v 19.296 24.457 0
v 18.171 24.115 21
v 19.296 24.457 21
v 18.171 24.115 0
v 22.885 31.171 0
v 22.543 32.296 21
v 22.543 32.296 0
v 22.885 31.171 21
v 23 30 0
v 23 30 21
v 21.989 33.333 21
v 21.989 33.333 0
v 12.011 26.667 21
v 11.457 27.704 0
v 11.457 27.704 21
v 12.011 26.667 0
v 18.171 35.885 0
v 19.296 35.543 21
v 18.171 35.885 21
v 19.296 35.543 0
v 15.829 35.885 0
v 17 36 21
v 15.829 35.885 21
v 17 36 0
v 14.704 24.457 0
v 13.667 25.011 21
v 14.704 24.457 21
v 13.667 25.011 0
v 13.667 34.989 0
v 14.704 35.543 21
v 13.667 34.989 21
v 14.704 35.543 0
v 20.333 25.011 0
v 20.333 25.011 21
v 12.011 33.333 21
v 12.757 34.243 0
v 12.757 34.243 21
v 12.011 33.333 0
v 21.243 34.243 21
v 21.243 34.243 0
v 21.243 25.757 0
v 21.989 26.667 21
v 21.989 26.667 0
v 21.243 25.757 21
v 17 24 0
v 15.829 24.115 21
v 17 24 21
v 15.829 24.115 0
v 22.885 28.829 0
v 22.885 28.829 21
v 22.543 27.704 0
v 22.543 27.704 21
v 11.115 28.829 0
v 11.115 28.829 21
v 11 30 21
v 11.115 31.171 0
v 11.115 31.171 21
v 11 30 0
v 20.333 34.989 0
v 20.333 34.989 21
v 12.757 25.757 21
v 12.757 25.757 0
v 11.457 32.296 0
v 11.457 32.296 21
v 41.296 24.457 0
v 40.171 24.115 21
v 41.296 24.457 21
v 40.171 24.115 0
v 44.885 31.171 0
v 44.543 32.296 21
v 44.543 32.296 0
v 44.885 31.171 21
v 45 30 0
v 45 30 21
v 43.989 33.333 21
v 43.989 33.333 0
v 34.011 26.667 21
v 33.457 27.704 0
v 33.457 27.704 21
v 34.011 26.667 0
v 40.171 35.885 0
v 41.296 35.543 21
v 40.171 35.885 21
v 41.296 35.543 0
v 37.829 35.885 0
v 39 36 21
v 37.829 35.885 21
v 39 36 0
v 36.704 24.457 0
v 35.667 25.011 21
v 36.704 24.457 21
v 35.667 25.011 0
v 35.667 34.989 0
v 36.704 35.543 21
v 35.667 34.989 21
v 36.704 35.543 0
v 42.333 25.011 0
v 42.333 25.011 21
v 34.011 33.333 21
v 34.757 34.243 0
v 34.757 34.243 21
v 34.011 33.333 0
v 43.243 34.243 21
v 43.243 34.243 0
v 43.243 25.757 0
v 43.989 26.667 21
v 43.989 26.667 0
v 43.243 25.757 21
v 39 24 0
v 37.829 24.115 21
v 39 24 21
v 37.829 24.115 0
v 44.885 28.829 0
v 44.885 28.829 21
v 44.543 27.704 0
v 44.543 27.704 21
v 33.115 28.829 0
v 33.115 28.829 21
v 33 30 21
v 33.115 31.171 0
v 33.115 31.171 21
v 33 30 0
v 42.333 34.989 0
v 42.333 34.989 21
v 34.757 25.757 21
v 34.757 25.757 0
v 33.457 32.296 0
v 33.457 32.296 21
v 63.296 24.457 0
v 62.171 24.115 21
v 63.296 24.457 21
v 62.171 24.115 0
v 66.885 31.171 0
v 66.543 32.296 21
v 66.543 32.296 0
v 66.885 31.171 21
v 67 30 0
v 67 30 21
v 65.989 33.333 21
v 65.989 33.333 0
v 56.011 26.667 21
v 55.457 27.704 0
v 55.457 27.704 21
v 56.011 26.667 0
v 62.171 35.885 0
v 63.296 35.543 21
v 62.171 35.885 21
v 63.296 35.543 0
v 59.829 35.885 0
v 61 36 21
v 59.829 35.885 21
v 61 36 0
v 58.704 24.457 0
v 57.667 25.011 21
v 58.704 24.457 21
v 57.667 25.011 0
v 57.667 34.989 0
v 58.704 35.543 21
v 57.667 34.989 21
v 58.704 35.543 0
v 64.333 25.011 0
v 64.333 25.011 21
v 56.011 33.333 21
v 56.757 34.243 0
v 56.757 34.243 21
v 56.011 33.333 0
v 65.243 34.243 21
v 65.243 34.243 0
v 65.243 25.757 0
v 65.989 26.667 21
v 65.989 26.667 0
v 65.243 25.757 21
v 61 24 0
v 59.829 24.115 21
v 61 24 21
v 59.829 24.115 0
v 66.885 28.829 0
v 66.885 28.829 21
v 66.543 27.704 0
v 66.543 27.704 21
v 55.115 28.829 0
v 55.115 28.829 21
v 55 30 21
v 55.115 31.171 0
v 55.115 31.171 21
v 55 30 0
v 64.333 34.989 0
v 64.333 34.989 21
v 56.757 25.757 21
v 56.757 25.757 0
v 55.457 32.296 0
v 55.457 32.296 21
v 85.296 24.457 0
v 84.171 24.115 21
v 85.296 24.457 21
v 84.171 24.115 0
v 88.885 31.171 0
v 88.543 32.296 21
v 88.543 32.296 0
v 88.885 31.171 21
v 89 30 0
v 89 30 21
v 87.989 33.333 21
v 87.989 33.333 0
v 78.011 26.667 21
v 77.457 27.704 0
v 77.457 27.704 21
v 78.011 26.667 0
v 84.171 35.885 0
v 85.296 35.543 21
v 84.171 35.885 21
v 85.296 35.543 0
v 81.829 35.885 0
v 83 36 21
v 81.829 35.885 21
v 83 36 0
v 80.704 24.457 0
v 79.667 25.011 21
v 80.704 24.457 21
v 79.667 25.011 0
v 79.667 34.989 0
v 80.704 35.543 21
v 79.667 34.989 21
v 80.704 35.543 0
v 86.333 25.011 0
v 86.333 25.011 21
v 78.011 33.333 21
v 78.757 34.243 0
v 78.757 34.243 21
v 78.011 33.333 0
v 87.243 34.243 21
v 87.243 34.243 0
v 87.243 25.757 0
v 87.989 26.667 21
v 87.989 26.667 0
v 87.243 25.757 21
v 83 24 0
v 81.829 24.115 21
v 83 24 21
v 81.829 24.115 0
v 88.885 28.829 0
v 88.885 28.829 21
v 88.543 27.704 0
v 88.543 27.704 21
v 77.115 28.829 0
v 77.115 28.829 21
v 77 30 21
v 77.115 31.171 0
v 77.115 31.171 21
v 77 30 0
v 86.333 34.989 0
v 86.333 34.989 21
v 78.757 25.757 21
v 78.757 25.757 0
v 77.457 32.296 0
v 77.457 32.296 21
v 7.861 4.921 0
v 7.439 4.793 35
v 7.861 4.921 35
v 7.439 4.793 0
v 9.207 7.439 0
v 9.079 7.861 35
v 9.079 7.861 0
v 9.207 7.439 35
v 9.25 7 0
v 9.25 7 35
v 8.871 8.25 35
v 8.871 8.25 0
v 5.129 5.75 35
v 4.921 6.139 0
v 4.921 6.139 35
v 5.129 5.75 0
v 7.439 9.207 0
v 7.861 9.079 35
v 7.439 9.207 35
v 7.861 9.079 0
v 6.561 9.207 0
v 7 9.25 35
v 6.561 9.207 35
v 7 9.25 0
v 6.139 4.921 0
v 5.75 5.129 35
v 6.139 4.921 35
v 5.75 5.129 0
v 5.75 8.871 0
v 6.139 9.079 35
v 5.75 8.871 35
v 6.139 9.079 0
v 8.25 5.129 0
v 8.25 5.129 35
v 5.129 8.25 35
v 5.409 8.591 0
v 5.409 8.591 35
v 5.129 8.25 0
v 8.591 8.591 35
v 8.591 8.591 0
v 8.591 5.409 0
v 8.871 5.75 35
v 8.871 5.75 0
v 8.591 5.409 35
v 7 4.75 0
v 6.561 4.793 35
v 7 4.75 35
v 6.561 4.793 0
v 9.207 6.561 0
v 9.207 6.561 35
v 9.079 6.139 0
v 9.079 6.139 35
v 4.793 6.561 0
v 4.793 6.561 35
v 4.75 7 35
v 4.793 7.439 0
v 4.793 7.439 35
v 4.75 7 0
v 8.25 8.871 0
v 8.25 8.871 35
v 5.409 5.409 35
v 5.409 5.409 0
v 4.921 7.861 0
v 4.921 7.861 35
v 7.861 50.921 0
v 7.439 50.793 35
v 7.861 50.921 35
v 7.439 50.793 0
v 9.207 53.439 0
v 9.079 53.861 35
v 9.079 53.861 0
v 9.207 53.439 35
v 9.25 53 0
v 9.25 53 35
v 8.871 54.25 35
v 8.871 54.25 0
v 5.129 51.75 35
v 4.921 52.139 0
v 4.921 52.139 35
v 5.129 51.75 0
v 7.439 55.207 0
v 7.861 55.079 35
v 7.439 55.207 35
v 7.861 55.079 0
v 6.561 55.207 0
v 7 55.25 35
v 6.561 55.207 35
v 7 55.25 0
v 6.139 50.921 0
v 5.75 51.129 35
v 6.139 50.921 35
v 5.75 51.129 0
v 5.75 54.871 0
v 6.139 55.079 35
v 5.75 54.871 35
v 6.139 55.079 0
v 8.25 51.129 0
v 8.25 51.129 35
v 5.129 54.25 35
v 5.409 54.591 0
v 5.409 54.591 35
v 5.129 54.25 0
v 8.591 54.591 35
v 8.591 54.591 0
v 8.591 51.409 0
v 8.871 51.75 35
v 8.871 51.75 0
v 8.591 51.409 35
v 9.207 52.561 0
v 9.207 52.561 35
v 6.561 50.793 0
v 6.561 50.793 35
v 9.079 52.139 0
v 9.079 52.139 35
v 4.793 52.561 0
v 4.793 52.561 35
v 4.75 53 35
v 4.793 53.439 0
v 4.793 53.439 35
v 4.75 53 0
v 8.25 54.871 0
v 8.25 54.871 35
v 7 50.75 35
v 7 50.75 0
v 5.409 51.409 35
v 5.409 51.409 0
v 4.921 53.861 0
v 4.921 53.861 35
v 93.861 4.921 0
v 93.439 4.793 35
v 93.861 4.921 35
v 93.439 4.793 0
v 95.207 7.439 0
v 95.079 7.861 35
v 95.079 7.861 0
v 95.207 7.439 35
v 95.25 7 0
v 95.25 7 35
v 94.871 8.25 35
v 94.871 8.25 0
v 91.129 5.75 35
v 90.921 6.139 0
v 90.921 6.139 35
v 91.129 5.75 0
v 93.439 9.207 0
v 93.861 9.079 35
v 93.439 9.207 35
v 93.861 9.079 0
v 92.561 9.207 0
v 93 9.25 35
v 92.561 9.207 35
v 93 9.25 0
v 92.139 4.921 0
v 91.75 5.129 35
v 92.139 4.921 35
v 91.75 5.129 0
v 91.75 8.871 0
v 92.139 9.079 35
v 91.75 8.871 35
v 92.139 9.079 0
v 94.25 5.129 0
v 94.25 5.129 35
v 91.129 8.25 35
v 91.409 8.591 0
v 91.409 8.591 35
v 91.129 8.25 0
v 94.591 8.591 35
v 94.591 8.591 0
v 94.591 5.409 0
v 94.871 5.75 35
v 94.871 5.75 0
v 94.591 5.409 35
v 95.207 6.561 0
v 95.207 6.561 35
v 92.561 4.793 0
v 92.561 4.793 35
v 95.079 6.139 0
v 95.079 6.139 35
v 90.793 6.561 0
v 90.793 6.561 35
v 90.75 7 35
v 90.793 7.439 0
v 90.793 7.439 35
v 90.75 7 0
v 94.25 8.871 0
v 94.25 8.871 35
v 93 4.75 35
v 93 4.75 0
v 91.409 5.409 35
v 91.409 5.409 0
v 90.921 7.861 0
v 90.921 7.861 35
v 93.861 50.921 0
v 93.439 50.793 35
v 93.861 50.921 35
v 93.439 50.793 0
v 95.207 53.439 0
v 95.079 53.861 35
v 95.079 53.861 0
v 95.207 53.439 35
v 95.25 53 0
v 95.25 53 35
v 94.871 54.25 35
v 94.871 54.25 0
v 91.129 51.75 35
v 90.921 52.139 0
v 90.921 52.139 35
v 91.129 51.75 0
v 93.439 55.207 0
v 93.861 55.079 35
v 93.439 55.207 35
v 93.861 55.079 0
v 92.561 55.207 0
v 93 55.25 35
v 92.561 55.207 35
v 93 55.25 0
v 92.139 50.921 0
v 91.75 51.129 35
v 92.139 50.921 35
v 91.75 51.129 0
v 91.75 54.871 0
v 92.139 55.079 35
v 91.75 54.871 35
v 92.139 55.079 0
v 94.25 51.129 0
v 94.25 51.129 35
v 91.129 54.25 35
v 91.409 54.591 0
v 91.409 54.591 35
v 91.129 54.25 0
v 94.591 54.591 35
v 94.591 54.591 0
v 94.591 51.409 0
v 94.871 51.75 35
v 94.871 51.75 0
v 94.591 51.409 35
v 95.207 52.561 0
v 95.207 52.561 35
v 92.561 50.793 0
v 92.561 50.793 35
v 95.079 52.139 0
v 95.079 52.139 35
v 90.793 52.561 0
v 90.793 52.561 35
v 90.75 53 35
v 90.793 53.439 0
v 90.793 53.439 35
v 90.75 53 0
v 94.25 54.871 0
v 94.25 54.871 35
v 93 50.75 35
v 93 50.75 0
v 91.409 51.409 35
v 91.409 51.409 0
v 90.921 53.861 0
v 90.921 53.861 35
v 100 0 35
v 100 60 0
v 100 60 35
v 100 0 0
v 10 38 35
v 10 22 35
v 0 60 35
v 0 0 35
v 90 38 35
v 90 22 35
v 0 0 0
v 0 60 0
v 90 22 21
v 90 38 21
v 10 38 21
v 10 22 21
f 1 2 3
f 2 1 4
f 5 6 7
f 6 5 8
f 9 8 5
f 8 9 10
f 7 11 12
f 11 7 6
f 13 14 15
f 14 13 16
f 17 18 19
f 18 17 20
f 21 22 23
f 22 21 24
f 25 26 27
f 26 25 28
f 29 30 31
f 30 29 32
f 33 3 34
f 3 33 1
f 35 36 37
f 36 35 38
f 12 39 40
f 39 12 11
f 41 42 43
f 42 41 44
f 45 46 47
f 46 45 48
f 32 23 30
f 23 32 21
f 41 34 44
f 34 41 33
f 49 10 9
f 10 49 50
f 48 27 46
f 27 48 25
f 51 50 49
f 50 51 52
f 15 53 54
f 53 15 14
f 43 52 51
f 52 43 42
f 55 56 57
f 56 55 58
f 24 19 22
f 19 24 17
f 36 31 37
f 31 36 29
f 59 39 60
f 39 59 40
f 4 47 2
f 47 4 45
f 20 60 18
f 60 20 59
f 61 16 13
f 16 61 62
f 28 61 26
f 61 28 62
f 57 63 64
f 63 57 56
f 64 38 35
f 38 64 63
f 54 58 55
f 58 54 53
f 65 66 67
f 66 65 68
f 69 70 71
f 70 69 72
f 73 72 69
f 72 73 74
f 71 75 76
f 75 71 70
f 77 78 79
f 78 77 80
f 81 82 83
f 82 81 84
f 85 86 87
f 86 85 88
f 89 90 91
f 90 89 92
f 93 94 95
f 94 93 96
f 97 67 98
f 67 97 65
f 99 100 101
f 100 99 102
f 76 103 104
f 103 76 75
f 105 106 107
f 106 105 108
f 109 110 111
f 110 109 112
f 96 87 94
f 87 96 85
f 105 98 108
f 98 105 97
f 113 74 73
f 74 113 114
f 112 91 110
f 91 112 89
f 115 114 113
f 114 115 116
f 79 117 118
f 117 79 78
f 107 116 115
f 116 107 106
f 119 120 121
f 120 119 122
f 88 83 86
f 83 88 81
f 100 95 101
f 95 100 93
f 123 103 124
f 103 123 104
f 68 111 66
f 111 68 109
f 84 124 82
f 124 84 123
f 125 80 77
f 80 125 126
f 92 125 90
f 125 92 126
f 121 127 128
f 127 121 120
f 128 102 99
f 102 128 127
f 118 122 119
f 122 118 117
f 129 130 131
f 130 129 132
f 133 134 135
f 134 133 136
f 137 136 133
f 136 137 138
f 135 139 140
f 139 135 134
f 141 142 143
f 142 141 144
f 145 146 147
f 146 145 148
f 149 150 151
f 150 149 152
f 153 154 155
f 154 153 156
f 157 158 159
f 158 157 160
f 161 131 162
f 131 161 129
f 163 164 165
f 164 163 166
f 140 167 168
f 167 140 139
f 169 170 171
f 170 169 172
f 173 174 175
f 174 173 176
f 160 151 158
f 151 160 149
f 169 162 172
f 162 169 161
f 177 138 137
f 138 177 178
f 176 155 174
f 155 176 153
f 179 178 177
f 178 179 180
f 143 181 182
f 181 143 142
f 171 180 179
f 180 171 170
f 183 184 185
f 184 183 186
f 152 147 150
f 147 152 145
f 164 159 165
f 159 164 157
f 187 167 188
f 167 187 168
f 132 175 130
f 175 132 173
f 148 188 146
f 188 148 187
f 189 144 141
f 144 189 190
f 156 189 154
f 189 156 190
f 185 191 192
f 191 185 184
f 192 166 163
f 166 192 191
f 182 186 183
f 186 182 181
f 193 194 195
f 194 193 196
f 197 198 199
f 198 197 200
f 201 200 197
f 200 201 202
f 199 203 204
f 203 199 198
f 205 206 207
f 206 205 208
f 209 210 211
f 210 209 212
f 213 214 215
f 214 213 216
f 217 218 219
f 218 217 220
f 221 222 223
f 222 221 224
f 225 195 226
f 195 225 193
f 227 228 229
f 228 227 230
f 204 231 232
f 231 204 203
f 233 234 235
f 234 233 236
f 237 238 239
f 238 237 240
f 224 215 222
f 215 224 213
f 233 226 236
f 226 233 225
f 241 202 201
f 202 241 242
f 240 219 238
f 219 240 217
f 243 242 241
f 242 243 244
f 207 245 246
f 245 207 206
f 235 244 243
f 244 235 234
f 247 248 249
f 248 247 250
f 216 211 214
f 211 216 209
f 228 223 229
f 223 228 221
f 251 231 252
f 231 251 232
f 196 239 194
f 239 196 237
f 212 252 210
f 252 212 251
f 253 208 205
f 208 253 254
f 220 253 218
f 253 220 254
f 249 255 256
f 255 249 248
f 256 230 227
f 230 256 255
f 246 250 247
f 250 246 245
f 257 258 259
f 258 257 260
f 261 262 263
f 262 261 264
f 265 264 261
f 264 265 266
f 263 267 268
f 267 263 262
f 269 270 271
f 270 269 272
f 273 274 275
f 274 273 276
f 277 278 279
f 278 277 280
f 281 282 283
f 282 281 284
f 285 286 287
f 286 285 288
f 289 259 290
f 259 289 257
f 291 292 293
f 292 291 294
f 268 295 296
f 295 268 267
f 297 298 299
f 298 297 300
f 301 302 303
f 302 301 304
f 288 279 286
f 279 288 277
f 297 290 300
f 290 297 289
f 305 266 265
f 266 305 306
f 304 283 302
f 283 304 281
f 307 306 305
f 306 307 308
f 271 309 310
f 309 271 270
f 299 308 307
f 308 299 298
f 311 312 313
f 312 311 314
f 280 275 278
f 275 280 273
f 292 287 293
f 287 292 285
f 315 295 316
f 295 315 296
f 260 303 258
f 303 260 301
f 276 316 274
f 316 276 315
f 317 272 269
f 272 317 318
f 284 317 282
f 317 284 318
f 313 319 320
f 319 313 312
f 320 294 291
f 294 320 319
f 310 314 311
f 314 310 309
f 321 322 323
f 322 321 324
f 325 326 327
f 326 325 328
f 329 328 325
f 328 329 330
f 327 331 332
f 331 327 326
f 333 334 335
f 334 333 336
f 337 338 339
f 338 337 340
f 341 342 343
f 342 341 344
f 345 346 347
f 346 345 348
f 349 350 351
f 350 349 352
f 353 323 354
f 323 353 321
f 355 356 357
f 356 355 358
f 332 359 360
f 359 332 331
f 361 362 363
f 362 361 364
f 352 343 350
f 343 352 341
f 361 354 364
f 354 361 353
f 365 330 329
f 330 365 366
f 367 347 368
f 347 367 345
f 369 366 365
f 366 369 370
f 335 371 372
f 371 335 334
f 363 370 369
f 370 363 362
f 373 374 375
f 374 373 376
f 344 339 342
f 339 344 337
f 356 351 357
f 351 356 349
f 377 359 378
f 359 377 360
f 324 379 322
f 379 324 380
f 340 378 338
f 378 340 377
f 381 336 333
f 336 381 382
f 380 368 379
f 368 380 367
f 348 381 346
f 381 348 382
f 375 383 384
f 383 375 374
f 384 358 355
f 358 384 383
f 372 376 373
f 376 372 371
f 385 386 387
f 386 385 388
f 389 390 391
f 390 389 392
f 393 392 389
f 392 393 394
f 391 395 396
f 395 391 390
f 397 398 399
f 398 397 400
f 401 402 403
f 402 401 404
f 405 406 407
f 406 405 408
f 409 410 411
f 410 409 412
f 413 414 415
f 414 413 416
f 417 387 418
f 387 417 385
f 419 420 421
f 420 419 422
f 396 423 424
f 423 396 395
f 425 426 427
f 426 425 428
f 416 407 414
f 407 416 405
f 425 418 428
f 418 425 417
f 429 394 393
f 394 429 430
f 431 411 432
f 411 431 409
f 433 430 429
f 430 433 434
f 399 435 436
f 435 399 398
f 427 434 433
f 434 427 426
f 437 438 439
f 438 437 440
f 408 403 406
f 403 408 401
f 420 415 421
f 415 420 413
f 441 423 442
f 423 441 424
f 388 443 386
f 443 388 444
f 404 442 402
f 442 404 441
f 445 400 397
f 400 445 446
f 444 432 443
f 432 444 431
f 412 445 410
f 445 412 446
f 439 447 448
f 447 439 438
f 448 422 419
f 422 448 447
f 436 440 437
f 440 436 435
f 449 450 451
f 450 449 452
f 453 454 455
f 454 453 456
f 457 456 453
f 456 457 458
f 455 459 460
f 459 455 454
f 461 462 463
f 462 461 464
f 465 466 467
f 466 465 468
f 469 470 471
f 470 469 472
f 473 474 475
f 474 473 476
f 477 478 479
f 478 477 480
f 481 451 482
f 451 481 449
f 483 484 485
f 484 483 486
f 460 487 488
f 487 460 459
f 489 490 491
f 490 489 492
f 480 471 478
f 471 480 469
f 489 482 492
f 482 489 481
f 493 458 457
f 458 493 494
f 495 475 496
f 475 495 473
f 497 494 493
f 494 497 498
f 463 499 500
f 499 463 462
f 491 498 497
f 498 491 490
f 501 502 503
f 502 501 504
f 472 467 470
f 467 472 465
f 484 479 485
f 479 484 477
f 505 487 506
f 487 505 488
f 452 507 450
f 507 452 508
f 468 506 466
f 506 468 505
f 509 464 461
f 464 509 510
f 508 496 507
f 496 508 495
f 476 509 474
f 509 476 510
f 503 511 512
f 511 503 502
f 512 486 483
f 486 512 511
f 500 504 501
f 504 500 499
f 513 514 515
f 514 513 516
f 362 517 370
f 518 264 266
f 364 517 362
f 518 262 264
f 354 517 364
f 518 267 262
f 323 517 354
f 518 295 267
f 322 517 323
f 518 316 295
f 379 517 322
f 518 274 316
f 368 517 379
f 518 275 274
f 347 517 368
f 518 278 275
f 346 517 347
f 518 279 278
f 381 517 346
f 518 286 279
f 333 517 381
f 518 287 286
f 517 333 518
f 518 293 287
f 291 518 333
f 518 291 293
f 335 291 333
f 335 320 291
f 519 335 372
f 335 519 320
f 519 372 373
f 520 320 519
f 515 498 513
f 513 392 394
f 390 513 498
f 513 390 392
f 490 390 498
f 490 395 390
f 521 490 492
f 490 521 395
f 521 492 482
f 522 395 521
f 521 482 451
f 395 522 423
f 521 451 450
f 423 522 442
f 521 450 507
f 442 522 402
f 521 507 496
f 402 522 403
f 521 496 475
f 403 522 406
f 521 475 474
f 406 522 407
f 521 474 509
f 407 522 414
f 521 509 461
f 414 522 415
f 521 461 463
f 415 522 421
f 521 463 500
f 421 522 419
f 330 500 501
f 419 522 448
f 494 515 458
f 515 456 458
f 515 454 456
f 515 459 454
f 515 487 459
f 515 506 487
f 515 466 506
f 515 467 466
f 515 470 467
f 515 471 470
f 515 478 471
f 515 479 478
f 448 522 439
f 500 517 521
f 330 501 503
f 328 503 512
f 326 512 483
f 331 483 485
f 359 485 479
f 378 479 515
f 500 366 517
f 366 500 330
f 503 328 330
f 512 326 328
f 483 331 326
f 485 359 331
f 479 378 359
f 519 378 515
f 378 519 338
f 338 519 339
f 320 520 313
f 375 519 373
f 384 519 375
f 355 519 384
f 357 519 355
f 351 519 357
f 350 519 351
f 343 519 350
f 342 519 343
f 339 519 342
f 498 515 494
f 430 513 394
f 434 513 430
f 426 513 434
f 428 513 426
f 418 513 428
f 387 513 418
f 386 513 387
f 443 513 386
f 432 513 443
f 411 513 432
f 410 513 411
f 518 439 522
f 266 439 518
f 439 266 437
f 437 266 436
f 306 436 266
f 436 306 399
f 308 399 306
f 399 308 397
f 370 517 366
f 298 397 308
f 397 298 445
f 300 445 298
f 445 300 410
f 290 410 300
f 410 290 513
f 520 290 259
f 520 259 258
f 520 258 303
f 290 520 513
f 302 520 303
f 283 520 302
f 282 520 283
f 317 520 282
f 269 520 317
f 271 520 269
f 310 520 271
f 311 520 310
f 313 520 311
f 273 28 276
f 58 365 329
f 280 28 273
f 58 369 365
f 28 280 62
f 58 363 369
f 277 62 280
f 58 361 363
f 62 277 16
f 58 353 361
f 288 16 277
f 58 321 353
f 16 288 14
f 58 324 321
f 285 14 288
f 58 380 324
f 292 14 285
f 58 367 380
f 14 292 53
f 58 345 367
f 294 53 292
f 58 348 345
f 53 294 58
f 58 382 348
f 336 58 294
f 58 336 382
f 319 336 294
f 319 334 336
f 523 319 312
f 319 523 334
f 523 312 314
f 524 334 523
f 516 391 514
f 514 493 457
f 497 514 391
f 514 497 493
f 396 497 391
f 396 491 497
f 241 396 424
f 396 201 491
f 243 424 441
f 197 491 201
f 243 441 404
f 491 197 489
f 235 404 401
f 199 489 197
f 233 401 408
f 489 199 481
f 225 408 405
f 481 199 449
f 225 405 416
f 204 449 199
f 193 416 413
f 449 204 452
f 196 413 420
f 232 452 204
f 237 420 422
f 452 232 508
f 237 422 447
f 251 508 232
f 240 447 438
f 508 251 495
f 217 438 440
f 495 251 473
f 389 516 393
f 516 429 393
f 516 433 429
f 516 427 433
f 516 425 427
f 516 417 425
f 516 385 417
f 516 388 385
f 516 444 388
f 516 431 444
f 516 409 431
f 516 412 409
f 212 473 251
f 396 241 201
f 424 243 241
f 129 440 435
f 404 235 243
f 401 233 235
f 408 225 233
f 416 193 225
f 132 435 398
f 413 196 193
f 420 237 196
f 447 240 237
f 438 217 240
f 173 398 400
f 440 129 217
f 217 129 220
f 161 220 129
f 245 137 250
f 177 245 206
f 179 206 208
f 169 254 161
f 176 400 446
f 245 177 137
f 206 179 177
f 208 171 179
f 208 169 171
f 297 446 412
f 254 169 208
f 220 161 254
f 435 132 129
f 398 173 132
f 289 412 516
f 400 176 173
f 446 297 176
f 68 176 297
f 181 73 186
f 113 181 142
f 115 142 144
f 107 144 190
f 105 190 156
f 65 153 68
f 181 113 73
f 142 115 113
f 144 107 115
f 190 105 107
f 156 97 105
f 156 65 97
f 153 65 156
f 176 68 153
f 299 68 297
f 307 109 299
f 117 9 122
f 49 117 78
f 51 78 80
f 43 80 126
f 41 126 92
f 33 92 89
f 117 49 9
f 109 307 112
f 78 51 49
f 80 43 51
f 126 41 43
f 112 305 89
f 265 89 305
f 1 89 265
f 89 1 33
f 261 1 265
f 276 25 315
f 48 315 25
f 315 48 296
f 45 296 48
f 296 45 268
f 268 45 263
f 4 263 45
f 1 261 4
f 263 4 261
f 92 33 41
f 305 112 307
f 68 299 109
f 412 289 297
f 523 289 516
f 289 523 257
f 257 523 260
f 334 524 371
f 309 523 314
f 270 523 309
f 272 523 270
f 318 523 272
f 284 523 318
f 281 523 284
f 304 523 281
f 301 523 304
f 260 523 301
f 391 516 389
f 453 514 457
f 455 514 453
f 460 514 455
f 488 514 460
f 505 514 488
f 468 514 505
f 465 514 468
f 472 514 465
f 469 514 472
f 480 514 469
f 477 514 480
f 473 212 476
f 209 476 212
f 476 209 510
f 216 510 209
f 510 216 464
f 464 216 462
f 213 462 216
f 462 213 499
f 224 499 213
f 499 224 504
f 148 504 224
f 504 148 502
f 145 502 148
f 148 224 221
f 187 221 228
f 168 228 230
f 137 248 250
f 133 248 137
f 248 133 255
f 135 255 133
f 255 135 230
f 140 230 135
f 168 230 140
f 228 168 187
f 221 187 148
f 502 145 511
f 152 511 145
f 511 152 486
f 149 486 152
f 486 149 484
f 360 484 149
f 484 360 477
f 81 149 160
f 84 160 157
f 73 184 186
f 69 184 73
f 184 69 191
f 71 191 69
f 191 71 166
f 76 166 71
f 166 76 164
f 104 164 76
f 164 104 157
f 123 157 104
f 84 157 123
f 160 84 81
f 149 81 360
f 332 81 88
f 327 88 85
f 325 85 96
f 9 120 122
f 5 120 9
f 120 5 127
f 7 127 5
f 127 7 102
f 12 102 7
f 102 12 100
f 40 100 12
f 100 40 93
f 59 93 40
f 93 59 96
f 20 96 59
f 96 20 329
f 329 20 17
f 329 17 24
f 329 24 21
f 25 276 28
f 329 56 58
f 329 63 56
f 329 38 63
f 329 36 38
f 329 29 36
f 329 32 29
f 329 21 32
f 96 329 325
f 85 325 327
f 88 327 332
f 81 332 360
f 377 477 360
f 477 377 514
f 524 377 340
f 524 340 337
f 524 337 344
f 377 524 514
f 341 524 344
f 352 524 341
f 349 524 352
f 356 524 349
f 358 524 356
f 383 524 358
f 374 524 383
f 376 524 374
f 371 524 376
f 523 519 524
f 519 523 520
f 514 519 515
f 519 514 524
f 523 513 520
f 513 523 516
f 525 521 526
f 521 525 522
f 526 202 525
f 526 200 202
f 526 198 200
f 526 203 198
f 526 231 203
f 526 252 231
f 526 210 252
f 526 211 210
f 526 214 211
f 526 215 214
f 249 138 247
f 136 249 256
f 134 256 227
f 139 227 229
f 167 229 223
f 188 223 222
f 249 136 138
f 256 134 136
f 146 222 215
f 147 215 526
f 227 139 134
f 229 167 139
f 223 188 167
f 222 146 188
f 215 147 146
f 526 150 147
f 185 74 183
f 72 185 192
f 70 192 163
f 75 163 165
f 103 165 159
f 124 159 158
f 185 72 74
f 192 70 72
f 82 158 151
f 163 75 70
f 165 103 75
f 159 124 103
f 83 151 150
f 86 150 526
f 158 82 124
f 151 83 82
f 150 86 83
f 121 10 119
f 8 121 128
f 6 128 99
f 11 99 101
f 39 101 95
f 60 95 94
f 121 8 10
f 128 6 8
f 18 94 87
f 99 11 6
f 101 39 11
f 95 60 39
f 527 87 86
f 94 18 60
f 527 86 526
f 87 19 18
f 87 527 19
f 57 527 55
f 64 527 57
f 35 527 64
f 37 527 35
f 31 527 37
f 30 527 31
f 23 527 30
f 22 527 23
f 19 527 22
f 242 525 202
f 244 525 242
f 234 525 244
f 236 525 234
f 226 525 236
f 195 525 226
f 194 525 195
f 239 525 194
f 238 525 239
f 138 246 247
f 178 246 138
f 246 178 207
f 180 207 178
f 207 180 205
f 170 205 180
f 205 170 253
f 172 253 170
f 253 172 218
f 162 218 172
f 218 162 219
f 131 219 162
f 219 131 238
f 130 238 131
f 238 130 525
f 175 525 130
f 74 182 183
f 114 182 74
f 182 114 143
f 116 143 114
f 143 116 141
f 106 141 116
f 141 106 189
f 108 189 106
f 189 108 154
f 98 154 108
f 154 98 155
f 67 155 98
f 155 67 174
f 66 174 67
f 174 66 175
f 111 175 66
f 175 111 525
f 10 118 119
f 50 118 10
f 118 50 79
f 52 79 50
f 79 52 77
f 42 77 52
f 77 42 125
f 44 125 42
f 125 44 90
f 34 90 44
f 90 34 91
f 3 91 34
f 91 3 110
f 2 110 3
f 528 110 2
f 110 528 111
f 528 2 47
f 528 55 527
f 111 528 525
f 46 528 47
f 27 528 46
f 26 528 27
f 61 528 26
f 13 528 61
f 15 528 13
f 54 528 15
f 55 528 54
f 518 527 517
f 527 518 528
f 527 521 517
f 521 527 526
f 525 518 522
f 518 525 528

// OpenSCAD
$fn = 32;

// ----------------------------------------------------------------------
// Manifold block: gallery_top manifold
// ----------------------------------------------------------------------

// --- parameters (mm) ---
block_l = 100;            // block length, X
block_w = 60;             // block width, Y
block_h = 35;             // block height, Z
port_d = 12;              // port bore diameter
port_pitch = 22;          // port pitch along X
gallery_d = 16;           // top gallery width, Y
gallery_depth = 14;       // gallery pocket depth
wall_p = 10;              // gallery end wall thickness, X
mnt_d = 4.5;              // mounting hole diameter
mnt_in = 7;               // mounting hole inset from the edges

n_ports = 4;  // ports in the row
port_x0 = (block_l - (n_ports - 1) * port_pitch) / 2;  // first port X

difference() {
  cube([block_l, block_w, block_h]);
  for (i = [0 : n_ports - 1])
    translate([port_x0 + i * port_pitch, block_w / 2, -1])
      cylinder(h = block_h + 2, d = port_d);
  translate([wall_p, block_w / 2 - gallery_d / 2, block_h - gallery_depth])
    cube([block_l - 2 * wall_p, gallery_d, gallery_depth + 1]);
  for (cx = [mnt_in, block_l - mnt_in])
    for (cy = [mnt_in, block_w - mnt_in])
      translate([cx, cy, -1]) cylinder(h = block_h + 2, d = mnt_d);
}
